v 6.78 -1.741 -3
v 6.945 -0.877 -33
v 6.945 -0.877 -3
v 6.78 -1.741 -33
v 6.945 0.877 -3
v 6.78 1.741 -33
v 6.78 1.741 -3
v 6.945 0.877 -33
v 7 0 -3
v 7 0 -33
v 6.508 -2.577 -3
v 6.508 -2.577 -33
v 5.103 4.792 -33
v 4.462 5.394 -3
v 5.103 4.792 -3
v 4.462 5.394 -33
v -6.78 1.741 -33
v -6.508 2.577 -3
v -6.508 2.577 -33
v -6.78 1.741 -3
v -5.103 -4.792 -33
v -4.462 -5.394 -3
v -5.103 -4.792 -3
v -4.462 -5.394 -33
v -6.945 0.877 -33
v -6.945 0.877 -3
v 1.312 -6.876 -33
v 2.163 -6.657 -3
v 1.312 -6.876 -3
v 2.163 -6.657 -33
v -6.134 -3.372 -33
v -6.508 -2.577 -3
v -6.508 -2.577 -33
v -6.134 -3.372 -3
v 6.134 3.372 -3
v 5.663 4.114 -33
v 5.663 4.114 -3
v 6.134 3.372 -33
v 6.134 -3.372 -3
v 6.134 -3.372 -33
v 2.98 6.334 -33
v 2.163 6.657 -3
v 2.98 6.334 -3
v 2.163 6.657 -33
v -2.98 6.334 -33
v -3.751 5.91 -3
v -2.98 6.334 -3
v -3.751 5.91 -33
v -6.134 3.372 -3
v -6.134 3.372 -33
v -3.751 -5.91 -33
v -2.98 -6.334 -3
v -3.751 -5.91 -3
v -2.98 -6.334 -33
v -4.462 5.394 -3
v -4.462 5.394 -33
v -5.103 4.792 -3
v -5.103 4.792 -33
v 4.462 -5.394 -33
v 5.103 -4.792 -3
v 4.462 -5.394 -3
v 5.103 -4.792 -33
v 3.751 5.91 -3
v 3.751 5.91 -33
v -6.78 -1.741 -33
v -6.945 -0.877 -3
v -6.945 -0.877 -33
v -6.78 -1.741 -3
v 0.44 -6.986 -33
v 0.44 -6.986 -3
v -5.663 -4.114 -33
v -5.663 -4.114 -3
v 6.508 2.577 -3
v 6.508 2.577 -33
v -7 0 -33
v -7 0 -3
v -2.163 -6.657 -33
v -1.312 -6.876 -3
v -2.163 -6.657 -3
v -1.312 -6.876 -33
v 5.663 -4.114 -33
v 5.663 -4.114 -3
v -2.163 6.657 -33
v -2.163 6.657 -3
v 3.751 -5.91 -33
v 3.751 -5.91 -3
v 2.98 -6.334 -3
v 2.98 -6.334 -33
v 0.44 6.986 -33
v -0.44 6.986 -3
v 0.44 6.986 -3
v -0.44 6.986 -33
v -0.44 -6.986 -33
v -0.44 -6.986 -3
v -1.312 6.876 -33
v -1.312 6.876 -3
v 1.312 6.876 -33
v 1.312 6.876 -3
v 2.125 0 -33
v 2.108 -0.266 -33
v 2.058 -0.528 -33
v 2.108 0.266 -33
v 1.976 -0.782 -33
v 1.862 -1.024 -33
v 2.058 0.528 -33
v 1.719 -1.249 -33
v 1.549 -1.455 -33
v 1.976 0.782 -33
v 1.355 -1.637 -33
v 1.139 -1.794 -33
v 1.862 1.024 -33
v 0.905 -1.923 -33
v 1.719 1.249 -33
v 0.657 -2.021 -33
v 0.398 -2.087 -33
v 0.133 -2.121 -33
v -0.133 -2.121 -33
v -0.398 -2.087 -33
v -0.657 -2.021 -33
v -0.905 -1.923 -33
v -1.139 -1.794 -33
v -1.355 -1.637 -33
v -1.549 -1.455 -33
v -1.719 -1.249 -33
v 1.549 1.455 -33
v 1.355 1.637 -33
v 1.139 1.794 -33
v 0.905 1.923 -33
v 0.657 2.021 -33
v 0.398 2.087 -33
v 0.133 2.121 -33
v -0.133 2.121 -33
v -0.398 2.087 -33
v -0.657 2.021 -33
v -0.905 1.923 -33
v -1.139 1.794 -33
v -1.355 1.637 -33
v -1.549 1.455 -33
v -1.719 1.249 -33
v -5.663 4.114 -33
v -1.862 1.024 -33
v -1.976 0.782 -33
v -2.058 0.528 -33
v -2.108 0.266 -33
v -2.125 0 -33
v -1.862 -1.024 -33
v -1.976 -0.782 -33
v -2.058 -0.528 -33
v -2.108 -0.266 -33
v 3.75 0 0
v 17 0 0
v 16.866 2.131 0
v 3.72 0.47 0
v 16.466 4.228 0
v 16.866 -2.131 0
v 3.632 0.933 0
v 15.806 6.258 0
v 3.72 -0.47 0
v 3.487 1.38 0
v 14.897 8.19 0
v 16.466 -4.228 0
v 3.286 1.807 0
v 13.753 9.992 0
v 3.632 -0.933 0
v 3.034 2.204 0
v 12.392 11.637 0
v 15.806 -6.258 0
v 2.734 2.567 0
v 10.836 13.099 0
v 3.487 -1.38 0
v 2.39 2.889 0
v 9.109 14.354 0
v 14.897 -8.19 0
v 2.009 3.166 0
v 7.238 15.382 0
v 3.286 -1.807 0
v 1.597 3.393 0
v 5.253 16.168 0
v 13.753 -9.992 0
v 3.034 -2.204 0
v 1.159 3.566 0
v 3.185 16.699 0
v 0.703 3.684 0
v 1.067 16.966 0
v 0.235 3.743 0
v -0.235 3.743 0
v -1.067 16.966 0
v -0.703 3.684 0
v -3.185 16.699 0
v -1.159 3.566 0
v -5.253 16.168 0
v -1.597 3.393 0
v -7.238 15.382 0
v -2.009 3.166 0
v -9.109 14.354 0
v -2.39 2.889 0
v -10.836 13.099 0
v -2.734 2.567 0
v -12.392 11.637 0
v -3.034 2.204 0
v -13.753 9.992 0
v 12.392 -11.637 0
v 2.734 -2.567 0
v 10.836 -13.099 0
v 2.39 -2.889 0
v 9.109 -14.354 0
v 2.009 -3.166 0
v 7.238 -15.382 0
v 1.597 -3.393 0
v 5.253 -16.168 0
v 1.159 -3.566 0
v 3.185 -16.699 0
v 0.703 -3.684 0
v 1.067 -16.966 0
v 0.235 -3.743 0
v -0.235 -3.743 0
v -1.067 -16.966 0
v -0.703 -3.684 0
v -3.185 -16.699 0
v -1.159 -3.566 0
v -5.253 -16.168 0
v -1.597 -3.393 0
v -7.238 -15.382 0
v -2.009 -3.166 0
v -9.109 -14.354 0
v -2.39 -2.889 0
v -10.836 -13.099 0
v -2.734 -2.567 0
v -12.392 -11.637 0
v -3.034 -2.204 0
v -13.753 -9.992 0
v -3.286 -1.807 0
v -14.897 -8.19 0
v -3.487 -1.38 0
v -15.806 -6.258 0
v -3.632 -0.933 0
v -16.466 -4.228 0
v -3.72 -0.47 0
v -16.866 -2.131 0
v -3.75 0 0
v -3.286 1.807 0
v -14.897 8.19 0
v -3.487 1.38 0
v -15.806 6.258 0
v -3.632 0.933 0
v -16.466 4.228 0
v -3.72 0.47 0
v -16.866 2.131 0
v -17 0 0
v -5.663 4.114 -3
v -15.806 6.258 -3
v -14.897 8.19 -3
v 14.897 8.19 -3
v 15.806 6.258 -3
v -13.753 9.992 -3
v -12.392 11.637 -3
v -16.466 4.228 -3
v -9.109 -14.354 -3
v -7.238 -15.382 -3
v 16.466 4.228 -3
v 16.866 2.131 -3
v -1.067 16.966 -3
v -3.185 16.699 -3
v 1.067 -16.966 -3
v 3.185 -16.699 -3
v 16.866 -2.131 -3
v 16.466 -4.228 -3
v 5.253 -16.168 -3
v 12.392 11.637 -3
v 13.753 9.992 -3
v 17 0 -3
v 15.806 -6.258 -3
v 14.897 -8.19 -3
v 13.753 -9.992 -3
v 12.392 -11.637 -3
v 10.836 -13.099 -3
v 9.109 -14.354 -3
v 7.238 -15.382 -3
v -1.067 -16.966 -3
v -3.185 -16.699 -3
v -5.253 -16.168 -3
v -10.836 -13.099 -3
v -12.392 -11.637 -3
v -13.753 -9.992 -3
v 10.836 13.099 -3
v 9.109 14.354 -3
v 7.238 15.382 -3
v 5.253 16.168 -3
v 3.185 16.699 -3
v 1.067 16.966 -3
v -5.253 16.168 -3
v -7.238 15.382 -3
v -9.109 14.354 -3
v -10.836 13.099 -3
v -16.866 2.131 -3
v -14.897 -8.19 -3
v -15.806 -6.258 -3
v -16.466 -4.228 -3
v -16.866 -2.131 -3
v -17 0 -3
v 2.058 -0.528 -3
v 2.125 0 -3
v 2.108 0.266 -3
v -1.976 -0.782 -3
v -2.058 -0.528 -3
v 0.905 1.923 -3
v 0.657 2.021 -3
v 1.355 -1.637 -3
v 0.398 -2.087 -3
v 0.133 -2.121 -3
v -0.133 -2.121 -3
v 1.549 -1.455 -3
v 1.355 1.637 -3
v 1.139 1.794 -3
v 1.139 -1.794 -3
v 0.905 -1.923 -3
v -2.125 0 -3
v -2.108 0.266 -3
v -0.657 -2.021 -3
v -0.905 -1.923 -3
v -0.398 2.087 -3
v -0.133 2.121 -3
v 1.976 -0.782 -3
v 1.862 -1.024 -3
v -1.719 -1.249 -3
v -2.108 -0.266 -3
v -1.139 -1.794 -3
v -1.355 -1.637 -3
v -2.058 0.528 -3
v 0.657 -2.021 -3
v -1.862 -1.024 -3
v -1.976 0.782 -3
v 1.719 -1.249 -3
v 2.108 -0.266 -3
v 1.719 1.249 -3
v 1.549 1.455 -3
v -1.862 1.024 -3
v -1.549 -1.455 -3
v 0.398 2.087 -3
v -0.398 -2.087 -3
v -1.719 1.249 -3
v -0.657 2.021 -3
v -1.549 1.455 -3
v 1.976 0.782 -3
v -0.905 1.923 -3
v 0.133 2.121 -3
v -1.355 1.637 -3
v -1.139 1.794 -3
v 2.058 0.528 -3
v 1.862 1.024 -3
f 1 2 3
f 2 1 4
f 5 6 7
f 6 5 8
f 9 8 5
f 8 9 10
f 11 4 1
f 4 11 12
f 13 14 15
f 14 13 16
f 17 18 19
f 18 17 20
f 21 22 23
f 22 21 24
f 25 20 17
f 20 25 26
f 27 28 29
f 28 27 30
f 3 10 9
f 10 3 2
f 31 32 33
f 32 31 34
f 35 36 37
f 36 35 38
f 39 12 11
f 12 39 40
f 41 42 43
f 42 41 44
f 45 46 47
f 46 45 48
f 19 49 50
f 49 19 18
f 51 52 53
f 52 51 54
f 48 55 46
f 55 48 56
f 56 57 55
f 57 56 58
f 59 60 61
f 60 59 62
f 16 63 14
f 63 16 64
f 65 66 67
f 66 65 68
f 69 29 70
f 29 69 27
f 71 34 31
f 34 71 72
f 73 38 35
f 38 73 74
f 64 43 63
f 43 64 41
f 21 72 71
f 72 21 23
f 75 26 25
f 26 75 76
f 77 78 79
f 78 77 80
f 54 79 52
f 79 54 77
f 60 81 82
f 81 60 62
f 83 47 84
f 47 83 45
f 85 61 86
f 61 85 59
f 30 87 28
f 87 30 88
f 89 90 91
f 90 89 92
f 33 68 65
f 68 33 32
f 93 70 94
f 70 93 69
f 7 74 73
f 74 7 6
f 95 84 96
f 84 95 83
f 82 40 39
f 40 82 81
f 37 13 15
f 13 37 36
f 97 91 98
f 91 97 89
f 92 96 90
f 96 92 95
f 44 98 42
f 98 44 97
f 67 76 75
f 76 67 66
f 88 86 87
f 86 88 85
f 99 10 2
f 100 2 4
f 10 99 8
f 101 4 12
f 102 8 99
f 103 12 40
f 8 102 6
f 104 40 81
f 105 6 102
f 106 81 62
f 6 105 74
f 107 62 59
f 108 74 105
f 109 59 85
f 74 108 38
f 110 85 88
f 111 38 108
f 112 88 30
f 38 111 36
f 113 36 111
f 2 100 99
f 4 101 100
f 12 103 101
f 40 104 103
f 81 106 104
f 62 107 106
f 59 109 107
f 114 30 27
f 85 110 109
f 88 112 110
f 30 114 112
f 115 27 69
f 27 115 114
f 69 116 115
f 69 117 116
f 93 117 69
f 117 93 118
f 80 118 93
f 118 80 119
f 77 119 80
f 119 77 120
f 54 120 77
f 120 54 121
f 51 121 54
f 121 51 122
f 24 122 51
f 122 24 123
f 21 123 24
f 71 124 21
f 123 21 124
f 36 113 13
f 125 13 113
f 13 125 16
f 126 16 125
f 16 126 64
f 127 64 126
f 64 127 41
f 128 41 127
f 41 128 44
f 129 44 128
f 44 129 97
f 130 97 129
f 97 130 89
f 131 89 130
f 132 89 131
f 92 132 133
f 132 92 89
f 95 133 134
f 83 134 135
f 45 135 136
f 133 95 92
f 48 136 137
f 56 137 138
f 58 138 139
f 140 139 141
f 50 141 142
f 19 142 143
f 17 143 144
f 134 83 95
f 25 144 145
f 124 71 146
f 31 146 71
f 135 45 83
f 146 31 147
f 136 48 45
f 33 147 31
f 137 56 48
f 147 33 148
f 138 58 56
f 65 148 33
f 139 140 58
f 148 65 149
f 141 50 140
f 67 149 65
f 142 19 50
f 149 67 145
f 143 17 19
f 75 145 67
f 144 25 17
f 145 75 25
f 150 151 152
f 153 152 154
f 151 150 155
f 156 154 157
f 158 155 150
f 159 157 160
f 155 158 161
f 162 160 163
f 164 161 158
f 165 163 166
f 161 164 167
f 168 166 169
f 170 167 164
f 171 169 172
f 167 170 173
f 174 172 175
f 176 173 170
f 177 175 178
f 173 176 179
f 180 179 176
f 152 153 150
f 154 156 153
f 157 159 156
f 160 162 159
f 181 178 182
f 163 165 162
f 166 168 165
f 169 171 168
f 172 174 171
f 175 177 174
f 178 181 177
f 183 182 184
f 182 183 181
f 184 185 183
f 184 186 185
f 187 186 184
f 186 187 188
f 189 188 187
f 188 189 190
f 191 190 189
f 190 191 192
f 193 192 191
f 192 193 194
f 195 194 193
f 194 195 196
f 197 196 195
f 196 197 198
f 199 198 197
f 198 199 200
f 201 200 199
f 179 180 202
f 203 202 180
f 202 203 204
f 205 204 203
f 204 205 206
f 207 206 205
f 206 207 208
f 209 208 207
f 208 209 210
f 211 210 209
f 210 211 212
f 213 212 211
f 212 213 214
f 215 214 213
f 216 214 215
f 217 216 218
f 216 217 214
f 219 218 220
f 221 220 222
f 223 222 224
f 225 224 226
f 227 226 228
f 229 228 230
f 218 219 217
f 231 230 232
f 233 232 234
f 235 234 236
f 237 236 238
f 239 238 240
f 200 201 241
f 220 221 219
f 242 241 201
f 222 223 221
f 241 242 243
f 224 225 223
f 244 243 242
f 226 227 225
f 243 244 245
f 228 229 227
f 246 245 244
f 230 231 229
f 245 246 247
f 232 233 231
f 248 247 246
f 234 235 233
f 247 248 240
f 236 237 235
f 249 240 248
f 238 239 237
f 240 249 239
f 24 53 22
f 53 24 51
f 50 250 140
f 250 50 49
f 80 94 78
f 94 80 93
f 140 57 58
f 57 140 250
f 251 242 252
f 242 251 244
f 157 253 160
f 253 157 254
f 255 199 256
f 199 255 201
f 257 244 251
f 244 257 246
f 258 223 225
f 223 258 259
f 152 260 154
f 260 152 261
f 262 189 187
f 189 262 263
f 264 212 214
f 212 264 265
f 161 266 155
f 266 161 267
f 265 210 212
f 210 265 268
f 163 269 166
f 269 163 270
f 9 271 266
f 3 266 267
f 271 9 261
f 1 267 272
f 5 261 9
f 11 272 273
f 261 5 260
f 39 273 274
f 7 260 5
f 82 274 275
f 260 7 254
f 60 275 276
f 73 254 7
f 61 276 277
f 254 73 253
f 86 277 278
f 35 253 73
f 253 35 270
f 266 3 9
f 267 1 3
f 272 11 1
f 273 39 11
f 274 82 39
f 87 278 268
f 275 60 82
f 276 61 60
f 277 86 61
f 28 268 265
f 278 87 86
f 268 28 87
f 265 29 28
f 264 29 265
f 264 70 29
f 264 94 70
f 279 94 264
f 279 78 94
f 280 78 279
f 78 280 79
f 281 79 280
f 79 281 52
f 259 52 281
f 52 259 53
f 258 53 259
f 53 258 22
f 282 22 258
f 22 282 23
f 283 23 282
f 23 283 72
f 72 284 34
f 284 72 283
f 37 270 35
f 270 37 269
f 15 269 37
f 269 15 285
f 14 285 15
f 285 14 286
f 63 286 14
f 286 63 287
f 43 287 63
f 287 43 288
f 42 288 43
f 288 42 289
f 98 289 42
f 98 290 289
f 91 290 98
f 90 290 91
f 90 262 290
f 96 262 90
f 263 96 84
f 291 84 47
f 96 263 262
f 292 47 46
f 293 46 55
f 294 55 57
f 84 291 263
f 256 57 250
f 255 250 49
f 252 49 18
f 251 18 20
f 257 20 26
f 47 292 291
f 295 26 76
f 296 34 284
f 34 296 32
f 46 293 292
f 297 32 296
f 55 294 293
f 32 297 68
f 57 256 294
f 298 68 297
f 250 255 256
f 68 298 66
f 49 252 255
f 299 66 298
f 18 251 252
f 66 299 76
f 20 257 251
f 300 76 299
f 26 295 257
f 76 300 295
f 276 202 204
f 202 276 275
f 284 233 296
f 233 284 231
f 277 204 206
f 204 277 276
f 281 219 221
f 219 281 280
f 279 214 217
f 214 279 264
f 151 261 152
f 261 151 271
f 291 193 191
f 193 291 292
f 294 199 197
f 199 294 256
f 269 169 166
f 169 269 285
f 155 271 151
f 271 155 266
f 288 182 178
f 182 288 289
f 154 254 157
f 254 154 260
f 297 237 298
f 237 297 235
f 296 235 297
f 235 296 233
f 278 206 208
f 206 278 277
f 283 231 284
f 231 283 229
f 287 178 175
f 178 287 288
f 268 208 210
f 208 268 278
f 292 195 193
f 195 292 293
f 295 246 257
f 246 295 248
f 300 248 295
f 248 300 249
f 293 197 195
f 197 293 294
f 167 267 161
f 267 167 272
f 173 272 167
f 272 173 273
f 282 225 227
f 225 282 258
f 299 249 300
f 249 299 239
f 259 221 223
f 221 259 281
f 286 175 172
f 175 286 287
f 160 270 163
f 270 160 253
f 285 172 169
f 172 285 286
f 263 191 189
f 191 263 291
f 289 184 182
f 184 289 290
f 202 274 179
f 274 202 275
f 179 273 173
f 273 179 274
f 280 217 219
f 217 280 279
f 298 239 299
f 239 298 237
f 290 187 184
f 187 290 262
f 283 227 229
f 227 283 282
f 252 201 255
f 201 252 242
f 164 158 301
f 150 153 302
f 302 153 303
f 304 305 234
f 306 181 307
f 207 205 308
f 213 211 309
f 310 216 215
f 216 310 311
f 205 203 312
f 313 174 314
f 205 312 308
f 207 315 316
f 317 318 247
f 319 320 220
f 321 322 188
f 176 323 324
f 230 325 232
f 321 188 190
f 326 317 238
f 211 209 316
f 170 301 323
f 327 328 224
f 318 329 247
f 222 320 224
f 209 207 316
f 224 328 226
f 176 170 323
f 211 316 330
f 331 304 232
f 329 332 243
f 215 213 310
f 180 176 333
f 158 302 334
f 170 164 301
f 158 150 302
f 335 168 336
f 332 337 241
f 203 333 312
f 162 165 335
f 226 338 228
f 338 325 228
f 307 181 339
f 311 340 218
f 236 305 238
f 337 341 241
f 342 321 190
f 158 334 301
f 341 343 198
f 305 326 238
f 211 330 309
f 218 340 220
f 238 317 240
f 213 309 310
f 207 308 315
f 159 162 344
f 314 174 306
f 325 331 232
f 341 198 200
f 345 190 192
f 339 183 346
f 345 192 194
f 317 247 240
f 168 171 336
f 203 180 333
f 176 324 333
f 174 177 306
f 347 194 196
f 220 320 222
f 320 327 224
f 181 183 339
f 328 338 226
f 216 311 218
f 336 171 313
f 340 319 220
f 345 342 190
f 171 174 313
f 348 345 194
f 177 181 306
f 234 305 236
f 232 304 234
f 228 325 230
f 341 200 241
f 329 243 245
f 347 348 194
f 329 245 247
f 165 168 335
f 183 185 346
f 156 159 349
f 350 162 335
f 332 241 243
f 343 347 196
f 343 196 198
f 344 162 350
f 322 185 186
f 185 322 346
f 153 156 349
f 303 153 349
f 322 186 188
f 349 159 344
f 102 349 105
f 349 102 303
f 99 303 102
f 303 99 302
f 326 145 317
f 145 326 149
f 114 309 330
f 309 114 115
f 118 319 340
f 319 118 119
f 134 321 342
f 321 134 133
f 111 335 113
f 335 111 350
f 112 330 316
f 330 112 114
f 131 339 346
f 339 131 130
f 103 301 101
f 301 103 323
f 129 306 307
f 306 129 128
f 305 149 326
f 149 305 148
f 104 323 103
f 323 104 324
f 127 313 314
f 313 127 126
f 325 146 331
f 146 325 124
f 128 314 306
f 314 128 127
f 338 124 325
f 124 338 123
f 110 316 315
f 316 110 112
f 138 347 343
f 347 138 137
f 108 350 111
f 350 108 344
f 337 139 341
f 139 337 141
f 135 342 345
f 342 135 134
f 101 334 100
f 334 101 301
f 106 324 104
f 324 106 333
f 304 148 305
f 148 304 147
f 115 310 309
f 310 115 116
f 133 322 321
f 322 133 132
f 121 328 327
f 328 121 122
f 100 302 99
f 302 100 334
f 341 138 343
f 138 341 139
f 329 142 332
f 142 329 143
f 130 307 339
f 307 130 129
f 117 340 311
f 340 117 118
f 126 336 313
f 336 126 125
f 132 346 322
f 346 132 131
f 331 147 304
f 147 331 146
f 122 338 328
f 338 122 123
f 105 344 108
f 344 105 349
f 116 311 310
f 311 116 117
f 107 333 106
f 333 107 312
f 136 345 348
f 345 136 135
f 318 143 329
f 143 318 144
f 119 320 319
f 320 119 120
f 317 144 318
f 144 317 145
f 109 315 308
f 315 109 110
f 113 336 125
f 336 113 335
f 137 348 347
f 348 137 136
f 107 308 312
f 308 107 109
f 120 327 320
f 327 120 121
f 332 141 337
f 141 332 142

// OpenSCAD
$fn = 50;


difference() {
	union() {
		translate(v = [0, 0, -33.0000000000]) {
			cylinder(h = 33, r = 7.0000000000);
		}
		translate(v = [0, 0, -3.0000000000]) {
			cylinder(h = 3, r = 17.0000000000);
		}
	}
	union() {
		translate(v = [0, 0, 0]) {
			rotate(a = [0, 0, 0]) {
				difference() {
					union() {
						#translate(v = [0, 0, -33.0000000000]) {
							cylinder(h = 33, r = 2.0000000000);
						}
						#translate(v = [0, 0, -3]) {
							cylinder(h = 3, r1 = 2.1250000000, r2 = 3.7500000000);
						}
						#translate(v = [0, 0, -33.0000000000]) {
							cylinder(h = 33, r = 2.1250000000);
						}
						#translate(v = [0, 0, -33.0000000000]) {
							cylinder(h = 33, r = 2.0000000000);
						}
					}
					union();
				}
			}
		}
	}
}
